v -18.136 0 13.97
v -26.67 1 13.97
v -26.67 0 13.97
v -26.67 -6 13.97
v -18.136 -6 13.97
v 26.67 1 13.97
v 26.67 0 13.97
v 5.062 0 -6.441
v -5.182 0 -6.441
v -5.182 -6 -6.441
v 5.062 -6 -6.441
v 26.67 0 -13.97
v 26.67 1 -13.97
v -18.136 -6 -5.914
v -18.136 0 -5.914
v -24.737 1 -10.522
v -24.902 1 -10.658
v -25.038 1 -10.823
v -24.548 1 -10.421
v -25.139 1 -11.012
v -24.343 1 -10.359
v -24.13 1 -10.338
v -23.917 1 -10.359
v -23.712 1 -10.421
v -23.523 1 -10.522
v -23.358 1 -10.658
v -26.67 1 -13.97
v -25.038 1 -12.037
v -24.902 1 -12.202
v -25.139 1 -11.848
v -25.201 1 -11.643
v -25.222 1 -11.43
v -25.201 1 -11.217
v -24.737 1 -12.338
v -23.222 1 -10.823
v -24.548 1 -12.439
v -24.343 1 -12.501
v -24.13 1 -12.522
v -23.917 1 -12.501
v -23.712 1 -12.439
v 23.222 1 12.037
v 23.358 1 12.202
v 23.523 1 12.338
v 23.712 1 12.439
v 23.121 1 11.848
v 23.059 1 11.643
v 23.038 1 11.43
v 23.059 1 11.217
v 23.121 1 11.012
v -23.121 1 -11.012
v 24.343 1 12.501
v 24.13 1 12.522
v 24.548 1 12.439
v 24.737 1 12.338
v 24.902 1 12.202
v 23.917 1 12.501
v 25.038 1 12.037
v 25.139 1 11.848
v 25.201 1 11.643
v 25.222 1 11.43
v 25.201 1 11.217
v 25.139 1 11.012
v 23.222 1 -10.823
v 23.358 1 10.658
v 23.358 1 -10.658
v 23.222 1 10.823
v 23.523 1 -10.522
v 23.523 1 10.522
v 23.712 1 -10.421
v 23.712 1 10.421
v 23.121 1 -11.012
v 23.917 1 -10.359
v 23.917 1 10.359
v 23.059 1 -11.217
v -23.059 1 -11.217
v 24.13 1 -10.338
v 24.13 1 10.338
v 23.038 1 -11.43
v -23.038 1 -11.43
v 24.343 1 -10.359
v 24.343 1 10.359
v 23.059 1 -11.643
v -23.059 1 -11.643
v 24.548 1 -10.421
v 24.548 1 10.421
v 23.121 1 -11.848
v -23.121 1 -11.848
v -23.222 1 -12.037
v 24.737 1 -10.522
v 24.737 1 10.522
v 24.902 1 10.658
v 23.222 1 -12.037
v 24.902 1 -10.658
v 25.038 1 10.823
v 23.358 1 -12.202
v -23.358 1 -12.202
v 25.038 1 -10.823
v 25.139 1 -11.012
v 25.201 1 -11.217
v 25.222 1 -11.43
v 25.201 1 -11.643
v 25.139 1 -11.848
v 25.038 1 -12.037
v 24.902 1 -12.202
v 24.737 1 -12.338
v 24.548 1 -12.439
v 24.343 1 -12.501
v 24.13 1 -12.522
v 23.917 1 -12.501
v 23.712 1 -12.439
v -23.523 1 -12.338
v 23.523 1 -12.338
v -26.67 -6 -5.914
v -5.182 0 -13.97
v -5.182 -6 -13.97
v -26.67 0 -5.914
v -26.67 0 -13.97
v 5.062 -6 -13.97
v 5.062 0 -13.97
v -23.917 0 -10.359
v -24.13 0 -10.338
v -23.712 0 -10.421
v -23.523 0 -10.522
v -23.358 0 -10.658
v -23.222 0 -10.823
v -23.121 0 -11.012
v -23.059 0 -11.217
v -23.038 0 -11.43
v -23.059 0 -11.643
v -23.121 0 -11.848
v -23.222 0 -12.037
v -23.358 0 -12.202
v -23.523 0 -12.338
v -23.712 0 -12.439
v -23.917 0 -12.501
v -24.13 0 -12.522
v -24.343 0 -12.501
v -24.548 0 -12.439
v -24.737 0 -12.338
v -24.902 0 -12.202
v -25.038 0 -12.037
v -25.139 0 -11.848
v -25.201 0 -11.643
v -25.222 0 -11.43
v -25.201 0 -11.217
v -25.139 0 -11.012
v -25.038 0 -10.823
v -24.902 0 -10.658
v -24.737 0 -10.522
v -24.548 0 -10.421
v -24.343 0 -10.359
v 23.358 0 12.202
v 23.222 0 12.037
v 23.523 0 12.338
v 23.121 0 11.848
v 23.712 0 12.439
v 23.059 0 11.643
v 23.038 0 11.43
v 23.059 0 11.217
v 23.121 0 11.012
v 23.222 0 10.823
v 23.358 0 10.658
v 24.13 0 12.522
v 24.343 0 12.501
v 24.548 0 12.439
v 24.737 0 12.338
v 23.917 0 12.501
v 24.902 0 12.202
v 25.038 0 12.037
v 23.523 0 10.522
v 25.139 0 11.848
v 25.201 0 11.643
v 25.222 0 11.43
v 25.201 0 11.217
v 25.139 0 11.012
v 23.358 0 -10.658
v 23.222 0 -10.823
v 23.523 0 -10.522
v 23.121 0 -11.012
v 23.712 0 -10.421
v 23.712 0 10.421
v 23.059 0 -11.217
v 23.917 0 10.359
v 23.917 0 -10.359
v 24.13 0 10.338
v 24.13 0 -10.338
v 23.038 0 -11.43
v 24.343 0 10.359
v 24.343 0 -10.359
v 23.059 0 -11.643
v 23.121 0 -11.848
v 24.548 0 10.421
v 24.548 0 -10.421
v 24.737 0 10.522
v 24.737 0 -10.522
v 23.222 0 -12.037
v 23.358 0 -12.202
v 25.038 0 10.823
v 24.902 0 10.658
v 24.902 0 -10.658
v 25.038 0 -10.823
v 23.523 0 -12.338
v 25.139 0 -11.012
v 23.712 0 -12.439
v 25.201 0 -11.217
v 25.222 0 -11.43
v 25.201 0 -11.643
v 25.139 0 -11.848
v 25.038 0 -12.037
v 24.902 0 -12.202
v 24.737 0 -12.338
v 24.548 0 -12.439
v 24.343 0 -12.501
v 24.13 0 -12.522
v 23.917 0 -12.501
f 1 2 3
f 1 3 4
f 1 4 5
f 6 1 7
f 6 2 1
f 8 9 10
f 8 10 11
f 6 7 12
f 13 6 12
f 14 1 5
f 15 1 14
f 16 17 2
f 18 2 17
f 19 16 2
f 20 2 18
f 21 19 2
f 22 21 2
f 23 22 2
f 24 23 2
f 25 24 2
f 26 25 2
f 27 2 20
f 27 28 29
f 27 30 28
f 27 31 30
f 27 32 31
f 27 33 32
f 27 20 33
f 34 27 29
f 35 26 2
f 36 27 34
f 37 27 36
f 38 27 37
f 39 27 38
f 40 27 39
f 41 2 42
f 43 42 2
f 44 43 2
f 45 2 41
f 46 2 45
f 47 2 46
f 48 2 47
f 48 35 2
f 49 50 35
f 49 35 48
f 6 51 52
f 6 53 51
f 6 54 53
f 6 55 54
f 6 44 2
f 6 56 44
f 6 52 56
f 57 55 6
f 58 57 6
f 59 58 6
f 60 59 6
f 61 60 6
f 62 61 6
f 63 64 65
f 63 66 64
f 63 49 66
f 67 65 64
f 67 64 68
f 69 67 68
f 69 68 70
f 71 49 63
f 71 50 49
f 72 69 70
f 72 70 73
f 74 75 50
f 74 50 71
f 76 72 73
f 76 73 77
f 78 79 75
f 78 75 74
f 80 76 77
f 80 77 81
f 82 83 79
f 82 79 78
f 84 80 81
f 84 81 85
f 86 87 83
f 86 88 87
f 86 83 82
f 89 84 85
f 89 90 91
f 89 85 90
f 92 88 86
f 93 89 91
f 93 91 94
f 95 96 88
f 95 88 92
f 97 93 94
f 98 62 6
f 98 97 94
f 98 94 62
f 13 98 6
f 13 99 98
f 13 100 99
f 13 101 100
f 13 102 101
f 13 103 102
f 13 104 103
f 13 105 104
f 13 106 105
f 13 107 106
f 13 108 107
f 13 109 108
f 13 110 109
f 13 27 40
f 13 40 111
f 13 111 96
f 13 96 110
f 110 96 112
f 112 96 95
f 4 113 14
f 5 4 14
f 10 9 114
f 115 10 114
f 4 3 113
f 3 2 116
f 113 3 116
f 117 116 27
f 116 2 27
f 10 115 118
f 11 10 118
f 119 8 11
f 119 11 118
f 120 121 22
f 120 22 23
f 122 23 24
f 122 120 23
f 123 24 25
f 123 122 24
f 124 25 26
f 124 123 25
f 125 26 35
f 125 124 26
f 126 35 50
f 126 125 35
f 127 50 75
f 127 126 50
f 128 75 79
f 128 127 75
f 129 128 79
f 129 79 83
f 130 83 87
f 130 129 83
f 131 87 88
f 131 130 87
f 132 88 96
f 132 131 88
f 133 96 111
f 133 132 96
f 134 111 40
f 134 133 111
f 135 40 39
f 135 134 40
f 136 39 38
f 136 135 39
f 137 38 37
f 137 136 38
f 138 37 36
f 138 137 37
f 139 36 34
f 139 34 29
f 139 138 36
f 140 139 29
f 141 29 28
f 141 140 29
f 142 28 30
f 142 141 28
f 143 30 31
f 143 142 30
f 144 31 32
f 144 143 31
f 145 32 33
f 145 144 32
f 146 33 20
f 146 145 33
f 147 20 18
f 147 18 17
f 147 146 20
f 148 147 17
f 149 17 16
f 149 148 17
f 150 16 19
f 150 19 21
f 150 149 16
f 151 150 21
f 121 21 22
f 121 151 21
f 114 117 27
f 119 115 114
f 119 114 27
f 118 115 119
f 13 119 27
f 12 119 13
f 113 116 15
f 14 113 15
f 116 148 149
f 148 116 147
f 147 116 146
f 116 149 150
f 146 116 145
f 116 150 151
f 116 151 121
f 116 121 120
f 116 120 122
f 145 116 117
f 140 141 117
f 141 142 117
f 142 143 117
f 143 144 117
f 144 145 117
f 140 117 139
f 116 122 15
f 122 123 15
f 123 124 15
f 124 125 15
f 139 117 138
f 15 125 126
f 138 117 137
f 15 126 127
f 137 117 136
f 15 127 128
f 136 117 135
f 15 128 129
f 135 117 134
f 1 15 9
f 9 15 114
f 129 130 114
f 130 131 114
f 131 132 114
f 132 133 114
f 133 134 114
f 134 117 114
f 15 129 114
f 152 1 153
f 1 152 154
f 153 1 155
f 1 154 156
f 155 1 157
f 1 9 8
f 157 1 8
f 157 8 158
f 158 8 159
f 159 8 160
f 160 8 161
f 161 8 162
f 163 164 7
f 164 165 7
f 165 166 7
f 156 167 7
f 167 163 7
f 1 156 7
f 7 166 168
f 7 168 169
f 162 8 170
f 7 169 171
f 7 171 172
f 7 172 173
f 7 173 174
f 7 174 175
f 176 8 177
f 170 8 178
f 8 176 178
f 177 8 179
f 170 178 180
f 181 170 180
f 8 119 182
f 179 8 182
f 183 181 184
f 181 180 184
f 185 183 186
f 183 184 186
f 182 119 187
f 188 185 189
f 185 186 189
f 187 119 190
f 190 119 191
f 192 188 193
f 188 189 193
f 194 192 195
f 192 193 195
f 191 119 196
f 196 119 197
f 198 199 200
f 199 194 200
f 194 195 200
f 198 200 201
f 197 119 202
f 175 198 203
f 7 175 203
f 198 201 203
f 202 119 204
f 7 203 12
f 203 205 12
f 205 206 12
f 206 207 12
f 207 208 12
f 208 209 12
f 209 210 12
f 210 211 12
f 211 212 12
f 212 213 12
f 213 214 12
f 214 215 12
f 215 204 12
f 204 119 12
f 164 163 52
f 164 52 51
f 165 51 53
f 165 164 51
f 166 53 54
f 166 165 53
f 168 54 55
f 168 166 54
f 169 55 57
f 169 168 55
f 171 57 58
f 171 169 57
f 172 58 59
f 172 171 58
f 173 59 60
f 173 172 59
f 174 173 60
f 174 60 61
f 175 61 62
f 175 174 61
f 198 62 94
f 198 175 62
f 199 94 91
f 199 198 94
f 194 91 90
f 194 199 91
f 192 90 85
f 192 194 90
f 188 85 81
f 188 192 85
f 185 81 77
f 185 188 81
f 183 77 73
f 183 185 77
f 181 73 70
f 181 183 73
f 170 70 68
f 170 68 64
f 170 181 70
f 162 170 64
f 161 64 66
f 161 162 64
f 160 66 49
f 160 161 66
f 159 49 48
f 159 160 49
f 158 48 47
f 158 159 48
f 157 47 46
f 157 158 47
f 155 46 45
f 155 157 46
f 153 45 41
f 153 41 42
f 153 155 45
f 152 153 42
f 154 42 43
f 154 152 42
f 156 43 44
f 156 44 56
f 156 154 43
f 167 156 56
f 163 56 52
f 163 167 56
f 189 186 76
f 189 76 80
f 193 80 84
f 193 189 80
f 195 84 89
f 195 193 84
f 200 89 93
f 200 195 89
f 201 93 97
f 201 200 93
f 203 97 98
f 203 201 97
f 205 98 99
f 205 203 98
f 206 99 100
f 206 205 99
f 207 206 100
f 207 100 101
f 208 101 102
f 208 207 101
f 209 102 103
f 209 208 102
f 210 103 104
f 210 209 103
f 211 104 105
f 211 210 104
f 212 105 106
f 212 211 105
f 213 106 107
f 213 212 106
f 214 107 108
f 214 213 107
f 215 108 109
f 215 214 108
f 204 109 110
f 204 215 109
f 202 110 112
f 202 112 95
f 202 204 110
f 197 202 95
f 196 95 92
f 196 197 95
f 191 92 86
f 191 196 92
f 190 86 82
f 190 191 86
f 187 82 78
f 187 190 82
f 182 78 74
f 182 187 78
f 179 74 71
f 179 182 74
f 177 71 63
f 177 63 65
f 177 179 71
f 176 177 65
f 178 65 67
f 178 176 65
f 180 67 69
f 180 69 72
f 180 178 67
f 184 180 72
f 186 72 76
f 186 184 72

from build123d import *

# Parameters (mm, degrees)
SKETCH1_W           = 53.34
SKETCH1_H           = 27.94
SKETCH1_R           = 1.0922
BOSS_EXTRUDE1_DEPTH = 1
SKETCH2_W           = 8.533603159
SKETCH2_H           = 19.883520928
SKETCH2_W_2         = 10.243705623
SKETCH2_H_2         = 7.528700328
BOSS_EXTRUDE2_DEPTH = 7


with BuildPart() as part:
    # Sketch1 → Boss-Extrude1 (new body)
    with BuildSketch(Plane(origin=(0, 0, 0), x_dir=(1, 0, 0), z_dir=(0, 1, 0))):
        Rectangle(SKETCH1_W, SKETCH1_H)
        with Locations(Location((-24.13, 11.43, 0), (0, 0, 270))):
            Circle(SKETCH1_R, mode=Mode.SUBTRACT)
        with Locations(Location((24.13, 11.43, 0), (0, 0, 270))):
            Circle(SKETCH1_R, mode=Mode.SUBTRACT)
        with Locations(Location((24.13, -11.43, 0), (0, 0, 270))):
            Circle(SKETCH1_R, mode=Mode.SUBTRACT)
    extrude(amount=BOSS_EXTRUDE1_DEPTH)

    # Sketch2 → Boss-Extrude2 (add)
    with BuildSketch(Plane(origin=(0, 1, 0), x_dir=(1, 0, 0), z_dir=(0, 1, 0))):
        with Locations((-22.403198421, -4.028239536)):
            Rectangle(SKETCH2_W, SKETCH2_H)
        with Locations((-0.059974857, 10.205649836)):
            Rectangle(SKETCH2_W_2, SKETCH2_H_2)
    extrude(amount=-BOSS_EXTRUDE2_DEPTH)


solid = part.part
